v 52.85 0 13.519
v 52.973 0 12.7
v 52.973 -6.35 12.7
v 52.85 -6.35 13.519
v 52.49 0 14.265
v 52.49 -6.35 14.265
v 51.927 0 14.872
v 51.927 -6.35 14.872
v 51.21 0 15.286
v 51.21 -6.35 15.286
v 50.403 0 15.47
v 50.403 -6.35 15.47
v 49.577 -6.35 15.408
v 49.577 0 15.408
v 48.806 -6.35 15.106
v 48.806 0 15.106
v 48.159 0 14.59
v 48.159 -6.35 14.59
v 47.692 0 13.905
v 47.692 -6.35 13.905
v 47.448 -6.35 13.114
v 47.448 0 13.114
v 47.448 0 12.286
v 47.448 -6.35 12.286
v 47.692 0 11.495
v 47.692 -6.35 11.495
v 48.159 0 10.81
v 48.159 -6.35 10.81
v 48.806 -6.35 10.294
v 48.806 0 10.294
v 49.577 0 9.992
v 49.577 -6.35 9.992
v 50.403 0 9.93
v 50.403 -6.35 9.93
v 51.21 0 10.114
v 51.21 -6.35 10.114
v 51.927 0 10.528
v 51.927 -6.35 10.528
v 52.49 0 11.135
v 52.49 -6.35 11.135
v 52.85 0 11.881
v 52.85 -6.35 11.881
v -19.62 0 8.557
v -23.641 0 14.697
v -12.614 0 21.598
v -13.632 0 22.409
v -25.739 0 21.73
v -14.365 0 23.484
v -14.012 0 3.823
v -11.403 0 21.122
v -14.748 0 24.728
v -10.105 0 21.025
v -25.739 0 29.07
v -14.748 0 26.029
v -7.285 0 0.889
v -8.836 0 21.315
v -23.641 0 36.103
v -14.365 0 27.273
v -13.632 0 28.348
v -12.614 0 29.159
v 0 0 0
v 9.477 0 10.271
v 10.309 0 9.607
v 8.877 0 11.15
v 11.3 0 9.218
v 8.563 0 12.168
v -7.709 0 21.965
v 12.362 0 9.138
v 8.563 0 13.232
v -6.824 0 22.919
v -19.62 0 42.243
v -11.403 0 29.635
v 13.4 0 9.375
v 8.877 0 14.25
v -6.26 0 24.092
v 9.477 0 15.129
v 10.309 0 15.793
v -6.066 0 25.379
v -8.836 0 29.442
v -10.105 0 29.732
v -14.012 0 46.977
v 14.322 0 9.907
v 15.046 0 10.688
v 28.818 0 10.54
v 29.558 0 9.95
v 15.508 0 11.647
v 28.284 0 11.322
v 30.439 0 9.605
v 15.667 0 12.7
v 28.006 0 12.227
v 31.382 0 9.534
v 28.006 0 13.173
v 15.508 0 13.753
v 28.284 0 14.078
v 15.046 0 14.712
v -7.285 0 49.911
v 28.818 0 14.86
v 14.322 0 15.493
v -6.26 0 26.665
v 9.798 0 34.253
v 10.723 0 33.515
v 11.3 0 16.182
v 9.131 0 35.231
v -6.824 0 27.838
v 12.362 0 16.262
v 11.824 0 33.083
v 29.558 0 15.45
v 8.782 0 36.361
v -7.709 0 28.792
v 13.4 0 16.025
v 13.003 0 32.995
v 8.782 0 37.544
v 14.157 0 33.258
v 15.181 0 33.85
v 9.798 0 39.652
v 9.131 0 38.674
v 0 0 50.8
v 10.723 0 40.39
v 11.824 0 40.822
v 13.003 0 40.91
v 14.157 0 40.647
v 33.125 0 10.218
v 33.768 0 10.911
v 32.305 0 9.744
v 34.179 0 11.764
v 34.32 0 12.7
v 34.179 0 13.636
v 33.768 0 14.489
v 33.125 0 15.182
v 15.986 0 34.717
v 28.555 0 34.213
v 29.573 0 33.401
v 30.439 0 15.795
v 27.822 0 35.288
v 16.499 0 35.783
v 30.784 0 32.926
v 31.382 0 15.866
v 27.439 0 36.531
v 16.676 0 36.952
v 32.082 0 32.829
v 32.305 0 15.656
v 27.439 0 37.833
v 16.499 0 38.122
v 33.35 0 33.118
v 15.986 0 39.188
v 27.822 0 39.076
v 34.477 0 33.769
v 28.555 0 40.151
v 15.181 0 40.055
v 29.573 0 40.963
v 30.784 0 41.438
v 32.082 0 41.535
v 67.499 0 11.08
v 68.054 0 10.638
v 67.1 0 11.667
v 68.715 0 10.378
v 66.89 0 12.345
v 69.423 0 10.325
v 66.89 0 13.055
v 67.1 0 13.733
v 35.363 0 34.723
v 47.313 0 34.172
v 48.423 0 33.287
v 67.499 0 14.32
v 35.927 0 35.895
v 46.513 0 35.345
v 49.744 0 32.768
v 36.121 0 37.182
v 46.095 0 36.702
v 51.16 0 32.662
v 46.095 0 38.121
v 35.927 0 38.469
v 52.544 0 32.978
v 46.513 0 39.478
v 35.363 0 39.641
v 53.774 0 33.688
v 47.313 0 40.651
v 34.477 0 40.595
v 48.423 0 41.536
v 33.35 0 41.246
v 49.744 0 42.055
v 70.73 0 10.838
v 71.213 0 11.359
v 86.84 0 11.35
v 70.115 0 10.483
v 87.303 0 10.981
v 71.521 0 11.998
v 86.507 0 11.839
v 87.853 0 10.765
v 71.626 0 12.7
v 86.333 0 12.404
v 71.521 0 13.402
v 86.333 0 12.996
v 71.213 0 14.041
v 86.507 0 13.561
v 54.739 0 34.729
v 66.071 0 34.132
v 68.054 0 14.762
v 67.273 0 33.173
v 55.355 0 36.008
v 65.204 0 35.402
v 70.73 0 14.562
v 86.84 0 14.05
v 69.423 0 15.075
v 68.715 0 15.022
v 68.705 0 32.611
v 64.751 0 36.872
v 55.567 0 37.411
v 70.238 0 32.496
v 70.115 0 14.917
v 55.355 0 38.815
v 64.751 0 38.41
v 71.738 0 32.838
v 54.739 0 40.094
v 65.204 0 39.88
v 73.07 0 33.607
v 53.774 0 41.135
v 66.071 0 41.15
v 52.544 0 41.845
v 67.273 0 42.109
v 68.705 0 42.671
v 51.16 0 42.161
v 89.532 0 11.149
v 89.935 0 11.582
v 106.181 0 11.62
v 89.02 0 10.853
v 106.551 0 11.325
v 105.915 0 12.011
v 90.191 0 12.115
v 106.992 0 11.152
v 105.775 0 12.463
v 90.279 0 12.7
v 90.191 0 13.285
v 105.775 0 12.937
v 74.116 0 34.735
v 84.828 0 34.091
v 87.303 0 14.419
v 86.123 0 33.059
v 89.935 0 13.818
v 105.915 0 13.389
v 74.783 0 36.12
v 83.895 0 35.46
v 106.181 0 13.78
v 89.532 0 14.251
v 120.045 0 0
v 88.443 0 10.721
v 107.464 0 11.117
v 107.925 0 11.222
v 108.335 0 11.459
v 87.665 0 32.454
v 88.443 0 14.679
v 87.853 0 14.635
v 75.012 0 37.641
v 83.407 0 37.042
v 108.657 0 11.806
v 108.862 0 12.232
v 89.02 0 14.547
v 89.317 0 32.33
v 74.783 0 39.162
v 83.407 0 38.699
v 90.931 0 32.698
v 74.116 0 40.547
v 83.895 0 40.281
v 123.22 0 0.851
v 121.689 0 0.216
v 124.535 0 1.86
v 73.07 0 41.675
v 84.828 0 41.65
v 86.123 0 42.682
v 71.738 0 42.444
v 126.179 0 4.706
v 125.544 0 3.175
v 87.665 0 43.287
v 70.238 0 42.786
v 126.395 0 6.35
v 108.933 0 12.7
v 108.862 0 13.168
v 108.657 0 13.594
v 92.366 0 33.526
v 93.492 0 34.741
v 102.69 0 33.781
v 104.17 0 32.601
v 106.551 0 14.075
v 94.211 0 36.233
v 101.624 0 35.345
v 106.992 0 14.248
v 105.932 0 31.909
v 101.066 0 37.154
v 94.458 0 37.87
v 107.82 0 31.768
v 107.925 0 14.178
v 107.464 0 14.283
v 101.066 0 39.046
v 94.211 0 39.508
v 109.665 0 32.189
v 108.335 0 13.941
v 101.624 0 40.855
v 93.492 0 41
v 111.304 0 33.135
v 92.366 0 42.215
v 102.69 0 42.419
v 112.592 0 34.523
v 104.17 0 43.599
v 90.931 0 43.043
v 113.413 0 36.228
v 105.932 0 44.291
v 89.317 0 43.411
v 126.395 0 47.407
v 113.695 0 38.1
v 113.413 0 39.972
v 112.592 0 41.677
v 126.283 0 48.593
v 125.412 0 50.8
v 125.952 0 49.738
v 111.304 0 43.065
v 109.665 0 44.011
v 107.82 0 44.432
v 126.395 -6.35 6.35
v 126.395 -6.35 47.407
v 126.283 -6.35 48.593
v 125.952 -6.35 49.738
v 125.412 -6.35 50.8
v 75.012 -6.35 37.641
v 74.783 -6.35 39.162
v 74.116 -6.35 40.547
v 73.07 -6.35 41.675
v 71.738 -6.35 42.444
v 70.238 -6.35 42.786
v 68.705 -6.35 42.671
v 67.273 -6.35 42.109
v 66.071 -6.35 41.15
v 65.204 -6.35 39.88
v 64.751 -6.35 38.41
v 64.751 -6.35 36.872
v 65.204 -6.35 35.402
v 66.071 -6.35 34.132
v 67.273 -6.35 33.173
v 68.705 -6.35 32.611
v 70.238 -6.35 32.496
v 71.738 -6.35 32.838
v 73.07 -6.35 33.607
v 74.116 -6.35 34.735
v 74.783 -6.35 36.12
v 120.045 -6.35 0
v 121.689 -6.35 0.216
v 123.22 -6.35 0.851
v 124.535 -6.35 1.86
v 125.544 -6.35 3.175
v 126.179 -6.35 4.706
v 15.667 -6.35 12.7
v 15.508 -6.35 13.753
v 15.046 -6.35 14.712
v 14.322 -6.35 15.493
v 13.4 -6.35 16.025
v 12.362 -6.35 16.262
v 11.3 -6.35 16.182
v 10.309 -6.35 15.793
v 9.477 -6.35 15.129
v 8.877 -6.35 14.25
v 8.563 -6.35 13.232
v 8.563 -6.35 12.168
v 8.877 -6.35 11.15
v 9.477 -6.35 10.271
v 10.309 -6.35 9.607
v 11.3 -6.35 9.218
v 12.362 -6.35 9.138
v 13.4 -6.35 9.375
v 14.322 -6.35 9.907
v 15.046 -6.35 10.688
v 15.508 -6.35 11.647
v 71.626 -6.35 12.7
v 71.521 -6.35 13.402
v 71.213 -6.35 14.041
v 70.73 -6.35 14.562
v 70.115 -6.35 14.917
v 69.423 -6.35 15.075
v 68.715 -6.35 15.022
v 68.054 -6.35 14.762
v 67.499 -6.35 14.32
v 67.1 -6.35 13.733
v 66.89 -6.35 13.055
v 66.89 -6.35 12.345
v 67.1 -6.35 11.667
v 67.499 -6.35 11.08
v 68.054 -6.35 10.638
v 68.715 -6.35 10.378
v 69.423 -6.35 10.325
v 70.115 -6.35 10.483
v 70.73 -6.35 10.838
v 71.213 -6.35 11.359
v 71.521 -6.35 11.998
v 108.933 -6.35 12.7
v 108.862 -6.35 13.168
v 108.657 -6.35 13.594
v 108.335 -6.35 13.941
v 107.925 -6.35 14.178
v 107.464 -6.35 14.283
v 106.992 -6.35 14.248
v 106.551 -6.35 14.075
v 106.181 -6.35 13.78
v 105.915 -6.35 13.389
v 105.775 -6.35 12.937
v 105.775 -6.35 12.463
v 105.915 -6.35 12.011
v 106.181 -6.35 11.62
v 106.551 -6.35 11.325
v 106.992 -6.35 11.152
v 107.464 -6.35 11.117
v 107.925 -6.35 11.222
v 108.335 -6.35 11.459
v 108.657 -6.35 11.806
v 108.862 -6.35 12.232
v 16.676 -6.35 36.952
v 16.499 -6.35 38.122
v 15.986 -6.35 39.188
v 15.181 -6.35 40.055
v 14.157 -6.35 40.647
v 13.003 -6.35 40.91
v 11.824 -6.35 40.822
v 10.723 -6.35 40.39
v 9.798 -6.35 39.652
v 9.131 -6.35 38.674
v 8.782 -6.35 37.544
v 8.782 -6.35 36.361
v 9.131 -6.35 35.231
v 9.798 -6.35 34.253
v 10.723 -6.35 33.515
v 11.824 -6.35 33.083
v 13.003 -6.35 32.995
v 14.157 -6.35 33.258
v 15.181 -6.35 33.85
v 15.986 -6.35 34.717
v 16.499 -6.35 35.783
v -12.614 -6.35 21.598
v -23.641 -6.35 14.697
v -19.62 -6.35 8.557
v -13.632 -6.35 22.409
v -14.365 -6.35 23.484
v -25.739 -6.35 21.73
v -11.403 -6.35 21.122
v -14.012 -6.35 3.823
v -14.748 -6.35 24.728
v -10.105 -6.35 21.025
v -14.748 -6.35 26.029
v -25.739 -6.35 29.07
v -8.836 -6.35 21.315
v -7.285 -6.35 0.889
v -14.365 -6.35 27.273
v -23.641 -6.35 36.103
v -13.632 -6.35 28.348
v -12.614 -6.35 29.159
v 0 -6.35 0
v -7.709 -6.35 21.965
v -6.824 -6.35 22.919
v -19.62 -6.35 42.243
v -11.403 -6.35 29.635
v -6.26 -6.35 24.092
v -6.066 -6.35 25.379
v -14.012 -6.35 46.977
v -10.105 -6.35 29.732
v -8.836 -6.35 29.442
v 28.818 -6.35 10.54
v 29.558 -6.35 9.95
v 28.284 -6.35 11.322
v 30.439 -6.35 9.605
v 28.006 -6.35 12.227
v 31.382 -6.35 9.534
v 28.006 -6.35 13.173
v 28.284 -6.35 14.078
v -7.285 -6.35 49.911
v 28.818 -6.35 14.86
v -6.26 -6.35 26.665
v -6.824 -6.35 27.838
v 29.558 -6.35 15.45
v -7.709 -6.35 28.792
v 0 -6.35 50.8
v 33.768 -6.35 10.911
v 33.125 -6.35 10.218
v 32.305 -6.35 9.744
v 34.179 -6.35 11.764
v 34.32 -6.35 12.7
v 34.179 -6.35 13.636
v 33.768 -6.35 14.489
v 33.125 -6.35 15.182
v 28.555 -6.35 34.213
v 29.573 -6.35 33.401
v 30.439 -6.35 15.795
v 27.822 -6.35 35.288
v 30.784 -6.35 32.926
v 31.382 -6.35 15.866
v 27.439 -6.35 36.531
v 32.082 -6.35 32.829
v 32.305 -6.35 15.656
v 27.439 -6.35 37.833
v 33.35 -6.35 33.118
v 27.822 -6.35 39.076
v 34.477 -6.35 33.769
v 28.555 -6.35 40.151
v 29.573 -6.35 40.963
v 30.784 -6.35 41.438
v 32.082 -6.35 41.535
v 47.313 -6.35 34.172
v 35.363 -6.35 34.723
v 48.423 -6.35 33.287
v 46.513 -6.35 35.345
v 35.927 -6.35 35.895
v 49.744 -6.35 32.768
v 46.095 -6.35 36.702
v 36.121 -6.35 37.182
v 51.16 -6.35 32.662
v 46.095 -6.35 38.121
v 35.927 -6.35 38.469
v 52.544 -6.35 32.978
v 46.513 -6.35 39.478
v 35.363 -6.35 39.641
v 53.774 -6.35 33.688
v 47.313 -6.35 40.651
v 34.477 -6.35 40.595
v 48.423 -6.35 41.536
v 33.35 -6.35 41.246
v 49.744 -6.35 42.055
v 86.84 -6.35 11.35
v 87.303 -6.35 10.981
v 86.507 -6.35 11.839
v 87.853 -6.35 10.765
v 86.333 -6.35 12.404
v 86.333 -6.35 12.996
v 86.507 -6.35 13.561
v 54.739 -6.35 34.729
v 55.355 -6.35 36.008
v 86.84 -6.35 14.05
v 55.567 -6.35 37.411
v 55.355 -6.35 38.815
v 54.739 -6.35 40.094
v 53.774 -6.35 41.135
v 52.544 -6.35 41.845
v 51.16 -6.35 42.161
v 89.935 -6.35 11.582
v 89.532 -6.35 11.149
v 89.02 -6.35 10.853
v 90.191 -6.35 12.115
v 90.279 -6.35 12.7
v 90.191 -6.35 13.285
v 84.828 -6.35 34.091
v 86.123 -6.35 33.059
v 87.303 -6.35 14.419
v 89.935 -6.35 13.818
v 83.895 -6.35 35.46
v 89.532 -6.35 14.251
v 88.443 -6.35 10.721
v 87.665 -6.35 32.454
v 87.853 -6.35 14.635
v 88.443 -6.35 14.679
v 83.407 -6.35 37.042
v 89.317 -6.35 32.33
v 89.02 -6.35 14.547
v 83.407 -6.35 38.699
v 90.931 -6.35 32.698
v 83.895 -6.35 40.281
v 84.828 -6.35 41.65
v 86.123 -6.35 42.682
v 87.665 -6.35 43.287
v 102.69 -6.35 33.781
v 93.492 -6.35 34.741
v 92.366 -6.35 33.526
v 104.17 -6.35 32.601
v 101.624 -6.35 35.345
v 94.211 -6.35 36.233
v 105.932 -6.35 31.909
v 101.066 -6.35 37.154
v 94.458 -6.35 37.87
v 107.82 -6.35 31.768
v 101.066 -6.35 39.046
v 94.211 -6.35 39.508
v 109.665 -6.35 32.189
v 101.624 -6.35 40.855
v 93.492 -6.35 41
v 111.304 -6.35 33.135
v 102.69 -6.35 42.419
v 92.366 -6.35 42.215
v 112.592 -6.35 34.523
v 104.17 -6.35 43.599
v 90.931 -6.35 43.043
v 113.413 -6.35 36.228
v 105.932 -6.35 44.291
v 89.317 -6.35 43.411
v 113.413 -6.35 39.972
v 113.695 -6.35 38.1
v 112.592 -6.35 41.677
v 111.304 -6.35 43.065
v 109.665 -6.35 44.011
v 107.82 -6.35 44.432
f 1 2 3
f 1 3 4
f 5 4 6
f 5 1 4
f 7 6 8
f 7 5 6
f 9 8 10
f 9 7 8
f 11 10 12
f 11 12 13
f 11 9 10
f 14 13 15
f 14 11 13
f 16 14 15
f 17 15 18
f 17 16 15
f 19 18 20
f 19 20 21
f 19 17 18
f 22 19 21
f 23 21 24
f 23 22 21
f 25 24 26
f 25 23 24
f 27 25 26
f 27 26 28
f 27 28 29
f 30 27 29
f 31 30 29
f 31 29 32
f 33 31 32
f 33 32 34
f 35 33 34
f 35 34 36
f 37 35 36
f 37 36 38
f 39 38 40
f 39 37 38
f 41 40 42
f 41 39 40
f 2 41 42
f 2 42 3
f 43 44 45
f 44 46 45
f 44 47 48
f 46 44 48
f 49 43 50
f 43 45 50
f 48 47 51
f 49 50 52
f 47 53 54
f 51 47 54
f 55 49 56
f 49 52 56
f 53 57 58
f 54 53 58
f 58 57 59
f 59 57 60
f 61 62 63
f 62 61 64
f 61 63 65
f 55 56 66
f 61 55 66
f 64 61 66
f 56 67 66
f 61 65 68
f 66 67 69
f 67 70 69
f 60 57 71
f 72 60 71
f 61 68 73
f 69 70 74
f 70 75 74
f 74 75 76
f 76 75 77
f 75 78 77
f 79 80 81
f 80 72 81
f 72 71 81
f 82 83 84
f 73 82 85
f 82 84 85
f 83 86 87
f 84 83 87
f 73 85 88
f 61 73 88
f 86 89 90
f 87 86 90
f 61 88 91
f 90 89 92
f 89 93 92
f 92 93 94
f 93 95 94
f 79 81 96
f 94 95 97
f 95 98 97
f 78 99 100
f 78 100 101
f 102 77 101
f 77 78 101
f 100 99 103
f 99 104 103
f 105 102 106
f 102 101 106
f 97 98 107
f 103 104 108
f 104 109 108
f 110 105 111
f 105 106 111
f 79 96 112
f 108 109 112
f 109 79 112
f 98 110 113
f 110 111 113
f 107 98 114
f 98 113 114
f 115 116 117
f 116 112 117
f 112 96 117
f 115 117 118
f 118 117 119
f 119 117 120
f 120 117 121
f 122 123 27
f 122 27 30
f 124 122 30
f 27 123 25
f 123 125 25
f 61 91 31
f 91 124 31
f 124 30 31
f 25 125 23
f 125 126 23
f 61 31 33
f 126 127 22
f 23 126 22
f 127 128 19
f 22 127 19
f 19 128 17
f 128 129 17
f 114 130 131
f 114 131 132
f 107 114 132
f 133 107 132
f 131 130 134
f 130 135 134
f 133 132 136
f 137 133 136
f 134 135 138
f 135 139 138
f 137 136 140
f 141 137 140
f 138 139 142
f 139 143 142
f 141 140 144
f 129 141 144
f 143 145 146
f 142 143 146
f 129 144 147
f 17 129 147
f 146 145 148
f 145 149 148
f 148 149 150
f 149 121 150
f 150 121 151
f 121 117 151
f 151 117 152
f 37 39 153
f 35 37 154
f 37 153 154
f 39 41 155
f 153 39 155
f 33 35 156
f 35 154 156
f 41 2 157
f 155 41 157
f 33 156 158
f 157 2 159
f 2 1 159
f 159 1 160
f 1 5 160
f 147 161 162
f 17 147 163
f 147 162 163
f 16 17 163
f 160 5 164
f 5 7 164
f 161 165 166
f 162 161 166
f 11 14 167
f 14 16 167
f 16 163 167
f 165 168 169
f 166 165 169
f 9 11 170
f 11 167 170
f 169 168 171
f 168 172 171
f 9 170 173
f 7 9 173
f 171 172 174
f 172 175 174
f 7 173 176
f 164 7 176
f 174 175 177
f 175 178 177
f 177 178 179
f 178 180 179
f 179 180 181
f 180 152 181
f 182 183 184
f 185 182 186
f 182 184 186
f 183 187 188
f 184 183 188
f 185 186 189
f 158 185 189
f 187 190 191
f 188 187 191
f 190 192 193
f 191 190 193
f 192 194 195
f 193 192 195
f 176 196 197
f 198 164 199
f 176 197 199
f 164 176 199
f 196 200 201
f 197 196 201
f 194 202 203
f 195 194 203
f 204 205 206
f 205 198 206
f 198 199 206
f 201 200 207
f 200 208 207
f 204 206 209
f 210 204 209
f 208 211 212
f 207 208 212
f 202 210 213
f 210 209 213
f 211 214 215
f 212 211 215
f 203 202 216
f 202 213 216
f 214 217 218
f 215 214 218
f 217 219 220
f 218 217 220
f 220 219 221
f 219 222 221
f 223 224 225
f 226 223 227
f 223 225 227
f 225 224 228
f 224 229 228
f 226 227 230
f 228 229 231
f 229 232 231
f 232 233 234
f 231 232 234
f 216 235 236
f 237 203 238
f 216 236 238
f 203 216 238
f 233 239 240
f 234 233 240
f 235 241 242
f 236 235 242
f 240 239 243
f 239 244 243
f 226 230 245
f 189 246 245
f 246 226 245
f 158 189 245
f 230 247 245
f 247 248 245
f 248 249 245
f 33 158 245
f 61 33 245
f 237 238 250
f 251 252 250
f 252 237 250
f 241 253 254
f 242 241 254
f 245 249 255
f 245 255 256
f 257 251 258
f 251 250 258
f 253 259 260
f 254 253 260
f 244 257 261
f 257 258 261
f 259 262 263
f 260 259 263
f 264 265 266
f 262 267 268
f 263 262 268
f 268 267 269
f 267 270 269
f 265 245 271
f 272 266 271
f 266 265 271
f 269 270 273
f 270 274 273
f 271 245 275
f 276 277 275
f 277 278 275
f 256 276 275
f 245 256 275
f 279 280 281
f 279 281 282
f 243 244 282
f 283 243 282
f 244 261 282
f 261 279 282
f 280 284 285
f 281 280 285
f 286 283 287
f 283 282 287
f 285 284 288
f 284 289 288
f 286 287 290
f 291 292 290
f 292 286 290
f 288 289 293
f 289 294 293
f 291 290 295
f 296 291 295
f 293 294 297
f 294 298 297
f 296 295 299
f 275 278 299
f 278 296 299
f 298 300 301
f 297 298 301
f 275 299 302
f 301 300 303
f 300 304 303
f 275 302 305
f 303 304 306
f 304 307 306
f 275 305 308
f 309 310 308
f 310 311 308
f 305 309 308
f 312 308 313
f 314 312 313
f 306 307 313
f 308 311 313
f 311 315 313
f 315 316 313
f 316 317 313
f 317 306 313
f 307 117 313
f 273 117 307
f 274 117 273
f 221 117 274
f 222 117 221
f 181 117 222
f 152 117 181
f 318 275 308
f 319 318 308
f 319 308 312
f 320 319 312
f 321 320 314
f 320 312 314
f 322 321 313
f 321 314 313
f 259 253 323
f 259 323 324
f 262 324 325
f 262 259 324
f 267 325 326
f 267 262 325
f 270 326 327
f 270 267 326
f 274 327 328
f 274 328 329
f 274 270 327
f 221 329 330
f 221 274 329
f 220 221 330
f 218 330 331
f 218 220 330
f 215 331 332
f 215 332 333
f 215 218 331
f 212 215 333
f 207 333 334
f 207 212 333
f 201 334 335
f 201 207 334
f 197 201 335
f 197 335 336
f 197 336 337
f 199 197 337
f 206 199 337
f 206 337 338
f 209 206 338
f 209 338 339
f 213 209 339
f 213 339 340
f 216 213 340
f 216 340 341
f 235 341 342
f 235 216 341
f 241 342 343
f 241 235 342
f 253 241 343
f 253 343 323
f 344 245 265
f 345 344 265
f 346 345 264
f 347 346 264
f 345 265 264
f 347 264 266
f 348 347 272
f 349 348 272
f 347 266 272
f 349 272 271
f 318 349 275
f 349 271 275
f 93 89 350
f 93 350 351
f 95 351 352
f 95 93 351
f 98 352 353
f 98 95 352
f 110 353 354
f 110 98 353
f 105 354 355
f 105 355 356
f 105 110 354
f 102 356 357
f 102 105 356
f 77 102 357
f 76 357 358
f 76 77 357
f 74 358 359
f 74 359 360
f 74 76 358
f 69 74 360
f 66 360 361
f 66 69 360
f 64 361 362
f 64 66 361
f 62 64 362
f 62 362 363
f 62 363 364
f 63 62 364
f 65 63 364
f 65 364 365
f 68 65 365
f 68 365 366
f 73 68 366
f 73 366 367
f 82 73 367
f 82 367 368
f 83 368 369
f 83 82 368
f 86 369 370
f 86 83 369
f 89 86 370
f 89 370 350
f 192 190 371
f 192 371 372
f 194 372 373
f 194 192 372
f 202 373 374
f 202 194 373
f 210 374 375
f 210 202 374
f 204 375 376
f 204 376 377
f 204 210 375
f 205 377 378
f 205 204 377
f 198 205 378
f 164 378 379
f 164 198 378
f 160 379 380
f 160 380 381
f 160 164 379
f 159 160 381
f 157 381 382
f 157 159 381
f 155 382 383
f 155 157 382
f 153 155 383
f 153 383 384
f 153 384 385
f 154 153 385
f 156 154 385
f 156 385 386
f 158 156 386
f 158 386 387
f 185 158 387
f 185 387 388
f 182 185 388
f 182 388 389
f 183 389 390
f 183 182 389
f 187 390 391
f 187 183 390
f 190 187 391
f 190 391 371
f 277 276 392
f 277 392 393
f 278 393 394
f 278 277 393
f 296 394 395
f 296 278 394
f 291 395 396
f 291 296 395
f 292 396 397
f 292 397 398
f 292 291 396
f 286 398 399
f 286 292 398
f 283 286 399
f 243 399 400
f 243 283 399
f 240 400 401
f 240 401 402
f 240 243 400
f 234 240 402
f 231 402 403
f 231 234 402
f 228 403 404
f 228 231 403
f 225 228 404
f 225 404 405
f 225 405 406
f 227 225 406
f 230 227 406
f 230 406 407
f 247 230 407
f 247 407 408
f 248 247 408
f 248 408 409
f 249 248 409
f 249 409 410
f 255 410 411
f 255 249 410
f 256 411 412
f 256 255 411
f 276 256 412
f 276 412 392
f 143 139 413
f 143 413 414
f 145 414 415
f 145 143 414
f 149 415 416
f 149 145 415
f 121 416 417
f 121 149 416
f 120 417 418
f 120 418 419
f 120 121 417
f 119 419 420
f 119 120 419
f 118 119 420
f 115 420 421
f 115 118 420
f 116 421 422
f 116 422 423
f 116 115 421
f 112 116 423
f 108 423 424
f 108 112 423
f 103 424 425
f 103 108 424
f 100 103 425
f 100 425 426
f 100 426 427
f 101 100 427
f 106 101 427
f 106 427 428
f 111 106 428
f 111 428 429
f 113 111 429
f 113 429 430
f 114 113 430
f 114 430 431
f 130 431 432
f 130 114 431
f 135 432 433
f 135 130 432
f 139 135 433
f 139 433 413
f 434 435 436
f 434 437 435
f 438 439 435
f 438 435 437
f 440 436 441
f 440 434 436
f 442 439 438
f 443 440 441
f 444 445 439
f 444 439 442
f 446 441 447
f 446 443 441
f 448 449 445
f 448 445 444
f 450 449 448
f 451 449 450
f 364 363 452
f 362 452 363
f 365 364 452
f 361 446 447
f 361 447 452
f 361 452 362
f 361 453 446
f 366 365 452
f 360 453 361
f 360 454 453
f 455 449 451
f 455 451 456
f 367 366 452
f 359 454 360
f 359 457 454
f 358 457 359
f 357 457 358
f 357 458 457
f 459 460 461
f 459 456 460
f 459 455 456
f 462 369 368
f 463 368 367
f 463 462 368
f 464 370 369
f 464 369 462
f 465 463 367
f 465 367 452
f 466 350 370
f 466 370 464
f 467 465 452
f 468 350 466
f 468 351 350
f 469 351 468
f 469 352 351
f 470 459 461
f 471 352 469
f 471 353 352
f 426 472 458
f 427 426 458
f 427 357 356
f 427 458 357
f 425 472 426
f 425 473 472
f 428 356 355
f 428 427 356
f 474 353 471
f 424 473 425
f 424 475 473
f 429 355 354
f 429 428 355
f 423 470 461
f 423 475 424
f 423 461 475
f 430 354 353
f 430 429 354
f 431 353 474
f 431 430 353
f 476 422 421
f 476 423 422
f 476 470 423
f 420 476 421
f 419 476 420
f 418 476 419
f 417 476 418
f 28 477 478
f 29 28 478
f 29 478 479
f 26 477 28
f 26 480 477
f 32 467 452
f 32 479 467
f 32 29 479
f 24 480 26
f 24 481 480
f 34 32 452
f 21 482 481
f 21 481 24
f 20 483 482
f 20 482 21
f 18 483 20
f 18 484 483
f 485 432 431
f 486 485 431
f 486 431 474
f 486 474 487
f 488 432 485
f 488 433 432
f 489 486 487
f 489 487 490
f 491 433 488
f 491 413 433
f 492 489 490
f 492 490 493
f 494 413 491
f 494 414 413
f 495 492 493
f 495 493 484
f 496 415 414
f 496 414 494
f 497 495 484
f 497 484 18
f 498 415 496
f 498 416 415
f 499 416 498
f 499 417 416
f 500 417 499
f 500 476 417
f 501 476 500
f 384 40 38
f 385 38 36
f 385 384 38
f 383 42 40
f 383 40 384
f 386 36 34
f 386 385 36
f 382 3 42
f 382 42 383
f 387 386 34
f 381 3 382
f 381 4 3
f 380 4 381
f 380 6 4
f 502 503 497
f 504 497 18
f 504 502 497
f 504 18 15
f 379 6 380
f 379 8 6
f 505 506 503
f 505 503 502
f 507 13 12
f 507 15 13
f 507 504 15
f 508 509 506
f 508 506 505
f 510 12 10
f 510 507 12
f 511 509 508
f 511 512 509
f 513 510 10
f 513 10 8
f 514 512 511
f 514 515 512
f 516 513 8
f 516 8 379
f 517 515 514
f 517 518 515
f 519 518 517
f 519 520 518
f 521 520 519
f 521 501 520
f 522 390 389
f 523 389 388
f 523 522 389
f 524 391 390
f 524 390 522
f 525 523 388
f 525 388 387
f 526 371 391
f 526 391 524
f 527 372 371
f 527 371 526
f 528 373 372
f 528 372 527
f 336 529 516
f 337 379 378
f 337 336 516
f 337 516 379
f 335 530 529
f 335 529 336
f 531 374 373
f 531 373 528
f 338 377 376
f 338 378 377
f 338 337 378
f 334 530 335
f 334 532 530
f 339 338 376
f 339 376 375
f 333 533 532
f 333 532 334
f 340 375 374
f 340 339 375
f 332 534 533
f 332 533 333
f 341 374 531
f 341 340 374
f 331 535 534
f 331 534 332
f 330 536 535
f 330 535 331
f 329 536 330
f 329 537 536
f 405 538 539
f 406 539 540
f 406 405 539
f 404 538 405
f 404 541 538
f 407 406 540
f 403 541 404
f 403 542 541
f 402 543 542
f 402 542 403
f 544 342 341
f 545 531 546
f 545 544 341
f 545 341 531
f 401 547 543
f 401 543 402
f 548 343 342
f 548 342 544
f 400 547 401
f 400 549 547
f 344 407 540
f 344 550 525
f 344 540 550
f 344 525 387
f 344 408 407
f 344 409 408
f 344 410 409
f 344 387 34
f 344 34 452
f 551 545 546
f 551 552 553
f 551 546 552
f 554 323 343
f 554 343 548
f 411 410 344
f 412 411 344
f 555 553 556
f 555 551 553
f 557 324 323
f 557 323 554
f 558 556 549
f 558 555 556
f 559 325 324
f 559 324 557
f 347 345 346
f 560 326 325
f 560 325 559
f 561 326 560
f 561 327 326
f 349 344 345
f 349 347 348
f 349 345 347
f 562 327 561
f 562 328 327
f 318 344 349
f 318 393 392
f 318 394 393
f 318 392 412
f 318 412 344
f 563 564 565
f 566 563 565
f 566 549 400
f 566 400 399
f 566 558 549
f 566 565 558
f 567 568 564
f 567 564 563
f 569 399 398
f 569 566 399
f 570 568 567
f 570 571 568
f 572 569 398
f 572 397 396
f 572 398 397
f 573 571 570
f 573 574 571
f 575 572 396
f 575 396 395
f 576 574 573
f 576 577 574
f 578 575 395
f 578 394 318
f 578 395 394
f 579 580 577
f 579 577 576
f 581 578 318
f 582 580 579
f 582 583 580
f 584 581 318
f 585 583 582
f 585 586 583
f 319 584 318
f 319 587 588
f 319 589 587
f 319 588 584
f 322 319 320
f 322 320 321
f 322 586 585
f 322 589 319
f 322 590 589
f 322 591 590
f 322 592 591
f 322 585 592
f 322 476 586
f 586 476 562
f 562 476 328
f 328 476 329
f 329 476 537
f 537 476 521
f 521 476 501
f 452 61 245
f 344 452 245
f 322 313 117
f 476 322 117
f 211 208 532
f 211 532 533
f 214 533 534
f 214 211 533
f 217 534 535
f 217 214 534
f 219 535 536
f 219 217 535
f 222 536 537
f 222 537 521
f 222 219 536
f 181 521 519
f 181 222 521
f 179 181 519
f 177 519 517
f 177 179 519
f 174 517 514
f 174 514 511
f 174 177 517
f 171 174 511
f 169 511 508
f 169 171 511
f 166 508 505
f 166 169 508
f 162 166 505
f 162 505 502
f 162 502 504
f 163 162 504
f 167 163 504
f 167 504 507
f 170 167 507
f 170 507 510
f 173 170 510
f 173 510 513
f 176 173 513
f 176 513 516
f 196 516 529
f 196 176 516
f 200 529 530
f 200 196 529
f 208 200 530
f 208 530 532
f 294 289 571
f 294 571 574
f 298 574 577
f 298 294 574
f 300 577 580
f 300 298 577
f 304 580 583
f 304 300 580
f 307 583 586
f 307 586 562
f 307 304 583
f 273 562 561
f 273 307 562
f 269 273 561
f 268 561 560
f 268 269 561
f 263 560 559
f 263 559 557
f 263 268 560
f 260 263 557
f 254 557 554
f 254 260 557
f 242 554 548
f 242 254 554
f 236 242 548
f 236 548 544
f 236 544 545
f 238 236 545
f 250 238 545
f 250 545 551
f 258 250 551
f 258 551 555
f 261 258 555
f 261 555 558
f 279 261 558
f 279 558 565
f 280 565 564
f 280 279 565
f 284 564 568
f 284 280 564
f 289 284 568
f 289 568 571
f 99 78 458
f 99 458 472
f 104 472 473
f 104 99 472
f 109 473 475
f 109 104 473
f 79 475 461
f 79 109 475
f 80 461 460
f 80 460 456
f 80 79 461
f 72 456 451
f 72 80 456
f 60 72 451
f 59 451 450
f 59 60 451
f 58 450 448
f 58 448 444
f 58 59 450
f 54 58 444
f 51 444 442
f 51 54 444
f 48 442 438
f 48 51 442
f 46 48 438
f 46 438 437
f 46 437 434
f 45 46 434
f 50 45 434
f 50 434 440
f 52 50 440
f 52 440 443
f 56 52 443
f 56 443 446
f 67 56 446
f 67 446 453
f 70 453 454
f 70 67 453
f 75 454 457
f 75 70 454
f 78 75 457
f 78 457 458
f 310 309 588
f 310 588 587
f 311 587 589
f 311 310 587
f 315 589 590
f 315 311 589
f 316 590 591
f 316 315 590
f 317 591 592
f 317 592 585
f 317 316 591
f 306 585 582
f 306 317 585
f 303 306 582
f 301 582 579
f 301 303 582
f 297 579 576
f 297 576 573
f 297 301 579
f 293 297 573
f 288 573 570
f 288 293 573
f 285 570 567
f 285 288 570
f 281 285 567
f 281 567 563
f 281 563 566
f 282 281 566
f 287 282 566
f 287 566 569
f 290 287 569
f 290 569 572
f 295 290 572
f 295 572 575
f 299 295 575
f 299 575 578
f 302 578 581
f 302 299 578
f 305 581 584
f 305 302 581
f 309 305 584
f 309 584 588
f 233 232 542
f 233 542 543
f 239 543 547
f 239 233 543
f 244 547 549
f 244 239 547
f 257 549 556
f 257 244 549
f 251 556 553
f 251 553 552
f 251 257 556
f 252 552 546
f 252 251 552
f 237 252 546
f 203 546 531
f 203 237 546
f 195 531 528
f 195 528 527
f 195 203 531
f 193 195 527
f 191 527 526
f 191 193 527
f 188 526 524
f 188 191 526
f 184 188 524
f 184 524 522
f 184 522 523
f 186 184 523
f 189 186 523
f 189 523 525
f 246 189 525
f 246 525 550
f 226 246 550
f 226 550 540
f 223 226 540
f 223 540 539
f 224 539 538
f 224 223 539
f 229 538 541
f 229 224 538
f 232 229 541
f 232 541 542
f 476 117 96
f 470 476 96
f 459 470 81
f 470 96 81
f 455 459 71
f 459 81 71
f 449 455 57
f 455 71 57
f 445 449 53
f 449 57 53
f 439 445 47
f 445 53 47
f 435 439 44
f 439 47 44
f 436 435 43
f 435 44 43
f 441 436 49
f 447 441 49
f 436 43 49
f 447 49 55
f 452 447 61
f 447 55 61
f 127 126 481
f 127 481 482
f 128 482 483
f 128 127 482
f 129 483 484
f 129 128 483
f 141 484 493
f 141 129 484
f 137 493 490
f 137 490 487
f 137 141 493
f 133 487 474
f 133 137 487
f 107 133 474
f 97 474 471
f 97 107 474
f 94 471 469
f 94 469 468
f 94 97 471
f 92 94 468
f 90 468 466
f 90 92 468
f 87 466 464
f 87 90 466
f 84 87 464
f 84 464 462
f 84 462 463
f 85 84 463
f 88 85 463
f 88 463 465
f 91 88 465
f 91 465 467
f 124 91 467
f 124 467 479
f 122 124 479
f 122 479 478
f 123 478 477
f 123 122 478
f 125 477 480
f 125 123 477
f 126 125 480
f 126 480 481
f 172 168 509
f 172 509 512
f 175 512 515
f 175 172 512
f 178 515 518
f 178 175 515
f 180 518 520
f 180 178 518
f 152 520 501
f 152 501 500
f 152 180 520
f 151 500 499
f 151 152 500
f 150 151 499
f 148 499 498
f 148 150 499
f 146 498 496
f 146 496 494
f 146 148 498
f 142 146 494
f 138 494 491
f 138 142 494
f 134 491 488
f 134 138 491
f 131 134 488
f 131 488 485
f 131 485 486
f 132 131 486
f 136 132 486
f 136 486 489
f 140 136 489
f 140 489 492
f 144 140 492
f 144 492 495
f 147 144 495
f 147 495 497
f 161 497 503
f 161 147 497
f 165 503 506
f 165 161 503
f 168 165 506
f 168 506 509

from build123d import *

# Parameters (mm, degrees)
F0_R     = 4.365625
F0_R_2   = 3.571875
F0_R_3   = 3.175
F0_R_4   = 2.778125
F0_R_5   = 2.38125
F0_R_6   = 1.984375
F0_R_7   = 1.5875
F0_R_8   = 3.96875
F0_R_9   = 4.7625
F0_R_10  = 5.159375
F0_R_11  = 5.55625
F0_R_12  = 6.35
F1_DEPTH = 6.35


with BuildPart() as f1:
    # F0 (on Front) → F1 (new body)
    with BuildSketch(Plane.XZ):
        with BuildLine():
            ThreePointArc((0, 50.8), (-26.004939, 25.4), (0, 0))
            Line((0, 0), (120.045061, 0))
            ThreePointArc((120.045061, 0), (124.53519, 1.859872), (126.395061, 6.35))
            Line((126.395061, 6.35), (126.395061, 47.406904))
            ThreePointArc((126.395061, 47.406904), (126.144477, 49.173152), (125.4125, 50.8))
            Line((125.4125, 50.8), (0, 50.8))
        make_face()
        with Locations((-10.43129, 25.378589)):
            Circle(F0_R, mode=Mode.SUBTRACT)
        with Locations((12.095061, 12.7)):
            Circle(F0_R_2, mode=Mode.SUBTRACT)
        with Locations((31.145061, 12.7)):
            Circle(F0_R_3, mode=Mode.SUBTRACT)
        with Locations((50.195061, 12.7)):
            Circle(F0_R_4, mode=Mode.SUBTRACT)
        with Locations((69.245061, 12.7)):
            Circle(F0_R_5, mode=Mode.SUBTRACT)
        with Locations((88.295061, 12.7)):
            Circle(F0_R_6, mode=Mode.SUBTRACT)
        with Locations((107.345061, 12.7)):
            Circle(F0_R_7, mode=Mode.SUBTRACT)
        with Locations((12.706912, 36.952493)):
            Circle(F0_R_8, mode=Mode.SUBTRACT)
        with Locations((31.75553, 37.181994)):
            Circle(F0_R, mode=Mode.SUBTRACT)
        with Locations((50.804147, 37.411496)):
            Circle(F0_R_9, mode=Mode.SUBTRACT)
        with Locations((69.852765, 37.640997)):
            Circle(F0_R_10, mode=Mode.SUBTRACT)
        with Locations((88.901382, 37.870499)):
            Circle(F0_R_11, mode=Mode.SUBTRACT)
        with Locations((107.345061, 38.1)):
            Circle(F0_R_12, mode=Mode.SUBTRACT)
    extrude(amount=F1_DEPTH)


solid = f1.part
